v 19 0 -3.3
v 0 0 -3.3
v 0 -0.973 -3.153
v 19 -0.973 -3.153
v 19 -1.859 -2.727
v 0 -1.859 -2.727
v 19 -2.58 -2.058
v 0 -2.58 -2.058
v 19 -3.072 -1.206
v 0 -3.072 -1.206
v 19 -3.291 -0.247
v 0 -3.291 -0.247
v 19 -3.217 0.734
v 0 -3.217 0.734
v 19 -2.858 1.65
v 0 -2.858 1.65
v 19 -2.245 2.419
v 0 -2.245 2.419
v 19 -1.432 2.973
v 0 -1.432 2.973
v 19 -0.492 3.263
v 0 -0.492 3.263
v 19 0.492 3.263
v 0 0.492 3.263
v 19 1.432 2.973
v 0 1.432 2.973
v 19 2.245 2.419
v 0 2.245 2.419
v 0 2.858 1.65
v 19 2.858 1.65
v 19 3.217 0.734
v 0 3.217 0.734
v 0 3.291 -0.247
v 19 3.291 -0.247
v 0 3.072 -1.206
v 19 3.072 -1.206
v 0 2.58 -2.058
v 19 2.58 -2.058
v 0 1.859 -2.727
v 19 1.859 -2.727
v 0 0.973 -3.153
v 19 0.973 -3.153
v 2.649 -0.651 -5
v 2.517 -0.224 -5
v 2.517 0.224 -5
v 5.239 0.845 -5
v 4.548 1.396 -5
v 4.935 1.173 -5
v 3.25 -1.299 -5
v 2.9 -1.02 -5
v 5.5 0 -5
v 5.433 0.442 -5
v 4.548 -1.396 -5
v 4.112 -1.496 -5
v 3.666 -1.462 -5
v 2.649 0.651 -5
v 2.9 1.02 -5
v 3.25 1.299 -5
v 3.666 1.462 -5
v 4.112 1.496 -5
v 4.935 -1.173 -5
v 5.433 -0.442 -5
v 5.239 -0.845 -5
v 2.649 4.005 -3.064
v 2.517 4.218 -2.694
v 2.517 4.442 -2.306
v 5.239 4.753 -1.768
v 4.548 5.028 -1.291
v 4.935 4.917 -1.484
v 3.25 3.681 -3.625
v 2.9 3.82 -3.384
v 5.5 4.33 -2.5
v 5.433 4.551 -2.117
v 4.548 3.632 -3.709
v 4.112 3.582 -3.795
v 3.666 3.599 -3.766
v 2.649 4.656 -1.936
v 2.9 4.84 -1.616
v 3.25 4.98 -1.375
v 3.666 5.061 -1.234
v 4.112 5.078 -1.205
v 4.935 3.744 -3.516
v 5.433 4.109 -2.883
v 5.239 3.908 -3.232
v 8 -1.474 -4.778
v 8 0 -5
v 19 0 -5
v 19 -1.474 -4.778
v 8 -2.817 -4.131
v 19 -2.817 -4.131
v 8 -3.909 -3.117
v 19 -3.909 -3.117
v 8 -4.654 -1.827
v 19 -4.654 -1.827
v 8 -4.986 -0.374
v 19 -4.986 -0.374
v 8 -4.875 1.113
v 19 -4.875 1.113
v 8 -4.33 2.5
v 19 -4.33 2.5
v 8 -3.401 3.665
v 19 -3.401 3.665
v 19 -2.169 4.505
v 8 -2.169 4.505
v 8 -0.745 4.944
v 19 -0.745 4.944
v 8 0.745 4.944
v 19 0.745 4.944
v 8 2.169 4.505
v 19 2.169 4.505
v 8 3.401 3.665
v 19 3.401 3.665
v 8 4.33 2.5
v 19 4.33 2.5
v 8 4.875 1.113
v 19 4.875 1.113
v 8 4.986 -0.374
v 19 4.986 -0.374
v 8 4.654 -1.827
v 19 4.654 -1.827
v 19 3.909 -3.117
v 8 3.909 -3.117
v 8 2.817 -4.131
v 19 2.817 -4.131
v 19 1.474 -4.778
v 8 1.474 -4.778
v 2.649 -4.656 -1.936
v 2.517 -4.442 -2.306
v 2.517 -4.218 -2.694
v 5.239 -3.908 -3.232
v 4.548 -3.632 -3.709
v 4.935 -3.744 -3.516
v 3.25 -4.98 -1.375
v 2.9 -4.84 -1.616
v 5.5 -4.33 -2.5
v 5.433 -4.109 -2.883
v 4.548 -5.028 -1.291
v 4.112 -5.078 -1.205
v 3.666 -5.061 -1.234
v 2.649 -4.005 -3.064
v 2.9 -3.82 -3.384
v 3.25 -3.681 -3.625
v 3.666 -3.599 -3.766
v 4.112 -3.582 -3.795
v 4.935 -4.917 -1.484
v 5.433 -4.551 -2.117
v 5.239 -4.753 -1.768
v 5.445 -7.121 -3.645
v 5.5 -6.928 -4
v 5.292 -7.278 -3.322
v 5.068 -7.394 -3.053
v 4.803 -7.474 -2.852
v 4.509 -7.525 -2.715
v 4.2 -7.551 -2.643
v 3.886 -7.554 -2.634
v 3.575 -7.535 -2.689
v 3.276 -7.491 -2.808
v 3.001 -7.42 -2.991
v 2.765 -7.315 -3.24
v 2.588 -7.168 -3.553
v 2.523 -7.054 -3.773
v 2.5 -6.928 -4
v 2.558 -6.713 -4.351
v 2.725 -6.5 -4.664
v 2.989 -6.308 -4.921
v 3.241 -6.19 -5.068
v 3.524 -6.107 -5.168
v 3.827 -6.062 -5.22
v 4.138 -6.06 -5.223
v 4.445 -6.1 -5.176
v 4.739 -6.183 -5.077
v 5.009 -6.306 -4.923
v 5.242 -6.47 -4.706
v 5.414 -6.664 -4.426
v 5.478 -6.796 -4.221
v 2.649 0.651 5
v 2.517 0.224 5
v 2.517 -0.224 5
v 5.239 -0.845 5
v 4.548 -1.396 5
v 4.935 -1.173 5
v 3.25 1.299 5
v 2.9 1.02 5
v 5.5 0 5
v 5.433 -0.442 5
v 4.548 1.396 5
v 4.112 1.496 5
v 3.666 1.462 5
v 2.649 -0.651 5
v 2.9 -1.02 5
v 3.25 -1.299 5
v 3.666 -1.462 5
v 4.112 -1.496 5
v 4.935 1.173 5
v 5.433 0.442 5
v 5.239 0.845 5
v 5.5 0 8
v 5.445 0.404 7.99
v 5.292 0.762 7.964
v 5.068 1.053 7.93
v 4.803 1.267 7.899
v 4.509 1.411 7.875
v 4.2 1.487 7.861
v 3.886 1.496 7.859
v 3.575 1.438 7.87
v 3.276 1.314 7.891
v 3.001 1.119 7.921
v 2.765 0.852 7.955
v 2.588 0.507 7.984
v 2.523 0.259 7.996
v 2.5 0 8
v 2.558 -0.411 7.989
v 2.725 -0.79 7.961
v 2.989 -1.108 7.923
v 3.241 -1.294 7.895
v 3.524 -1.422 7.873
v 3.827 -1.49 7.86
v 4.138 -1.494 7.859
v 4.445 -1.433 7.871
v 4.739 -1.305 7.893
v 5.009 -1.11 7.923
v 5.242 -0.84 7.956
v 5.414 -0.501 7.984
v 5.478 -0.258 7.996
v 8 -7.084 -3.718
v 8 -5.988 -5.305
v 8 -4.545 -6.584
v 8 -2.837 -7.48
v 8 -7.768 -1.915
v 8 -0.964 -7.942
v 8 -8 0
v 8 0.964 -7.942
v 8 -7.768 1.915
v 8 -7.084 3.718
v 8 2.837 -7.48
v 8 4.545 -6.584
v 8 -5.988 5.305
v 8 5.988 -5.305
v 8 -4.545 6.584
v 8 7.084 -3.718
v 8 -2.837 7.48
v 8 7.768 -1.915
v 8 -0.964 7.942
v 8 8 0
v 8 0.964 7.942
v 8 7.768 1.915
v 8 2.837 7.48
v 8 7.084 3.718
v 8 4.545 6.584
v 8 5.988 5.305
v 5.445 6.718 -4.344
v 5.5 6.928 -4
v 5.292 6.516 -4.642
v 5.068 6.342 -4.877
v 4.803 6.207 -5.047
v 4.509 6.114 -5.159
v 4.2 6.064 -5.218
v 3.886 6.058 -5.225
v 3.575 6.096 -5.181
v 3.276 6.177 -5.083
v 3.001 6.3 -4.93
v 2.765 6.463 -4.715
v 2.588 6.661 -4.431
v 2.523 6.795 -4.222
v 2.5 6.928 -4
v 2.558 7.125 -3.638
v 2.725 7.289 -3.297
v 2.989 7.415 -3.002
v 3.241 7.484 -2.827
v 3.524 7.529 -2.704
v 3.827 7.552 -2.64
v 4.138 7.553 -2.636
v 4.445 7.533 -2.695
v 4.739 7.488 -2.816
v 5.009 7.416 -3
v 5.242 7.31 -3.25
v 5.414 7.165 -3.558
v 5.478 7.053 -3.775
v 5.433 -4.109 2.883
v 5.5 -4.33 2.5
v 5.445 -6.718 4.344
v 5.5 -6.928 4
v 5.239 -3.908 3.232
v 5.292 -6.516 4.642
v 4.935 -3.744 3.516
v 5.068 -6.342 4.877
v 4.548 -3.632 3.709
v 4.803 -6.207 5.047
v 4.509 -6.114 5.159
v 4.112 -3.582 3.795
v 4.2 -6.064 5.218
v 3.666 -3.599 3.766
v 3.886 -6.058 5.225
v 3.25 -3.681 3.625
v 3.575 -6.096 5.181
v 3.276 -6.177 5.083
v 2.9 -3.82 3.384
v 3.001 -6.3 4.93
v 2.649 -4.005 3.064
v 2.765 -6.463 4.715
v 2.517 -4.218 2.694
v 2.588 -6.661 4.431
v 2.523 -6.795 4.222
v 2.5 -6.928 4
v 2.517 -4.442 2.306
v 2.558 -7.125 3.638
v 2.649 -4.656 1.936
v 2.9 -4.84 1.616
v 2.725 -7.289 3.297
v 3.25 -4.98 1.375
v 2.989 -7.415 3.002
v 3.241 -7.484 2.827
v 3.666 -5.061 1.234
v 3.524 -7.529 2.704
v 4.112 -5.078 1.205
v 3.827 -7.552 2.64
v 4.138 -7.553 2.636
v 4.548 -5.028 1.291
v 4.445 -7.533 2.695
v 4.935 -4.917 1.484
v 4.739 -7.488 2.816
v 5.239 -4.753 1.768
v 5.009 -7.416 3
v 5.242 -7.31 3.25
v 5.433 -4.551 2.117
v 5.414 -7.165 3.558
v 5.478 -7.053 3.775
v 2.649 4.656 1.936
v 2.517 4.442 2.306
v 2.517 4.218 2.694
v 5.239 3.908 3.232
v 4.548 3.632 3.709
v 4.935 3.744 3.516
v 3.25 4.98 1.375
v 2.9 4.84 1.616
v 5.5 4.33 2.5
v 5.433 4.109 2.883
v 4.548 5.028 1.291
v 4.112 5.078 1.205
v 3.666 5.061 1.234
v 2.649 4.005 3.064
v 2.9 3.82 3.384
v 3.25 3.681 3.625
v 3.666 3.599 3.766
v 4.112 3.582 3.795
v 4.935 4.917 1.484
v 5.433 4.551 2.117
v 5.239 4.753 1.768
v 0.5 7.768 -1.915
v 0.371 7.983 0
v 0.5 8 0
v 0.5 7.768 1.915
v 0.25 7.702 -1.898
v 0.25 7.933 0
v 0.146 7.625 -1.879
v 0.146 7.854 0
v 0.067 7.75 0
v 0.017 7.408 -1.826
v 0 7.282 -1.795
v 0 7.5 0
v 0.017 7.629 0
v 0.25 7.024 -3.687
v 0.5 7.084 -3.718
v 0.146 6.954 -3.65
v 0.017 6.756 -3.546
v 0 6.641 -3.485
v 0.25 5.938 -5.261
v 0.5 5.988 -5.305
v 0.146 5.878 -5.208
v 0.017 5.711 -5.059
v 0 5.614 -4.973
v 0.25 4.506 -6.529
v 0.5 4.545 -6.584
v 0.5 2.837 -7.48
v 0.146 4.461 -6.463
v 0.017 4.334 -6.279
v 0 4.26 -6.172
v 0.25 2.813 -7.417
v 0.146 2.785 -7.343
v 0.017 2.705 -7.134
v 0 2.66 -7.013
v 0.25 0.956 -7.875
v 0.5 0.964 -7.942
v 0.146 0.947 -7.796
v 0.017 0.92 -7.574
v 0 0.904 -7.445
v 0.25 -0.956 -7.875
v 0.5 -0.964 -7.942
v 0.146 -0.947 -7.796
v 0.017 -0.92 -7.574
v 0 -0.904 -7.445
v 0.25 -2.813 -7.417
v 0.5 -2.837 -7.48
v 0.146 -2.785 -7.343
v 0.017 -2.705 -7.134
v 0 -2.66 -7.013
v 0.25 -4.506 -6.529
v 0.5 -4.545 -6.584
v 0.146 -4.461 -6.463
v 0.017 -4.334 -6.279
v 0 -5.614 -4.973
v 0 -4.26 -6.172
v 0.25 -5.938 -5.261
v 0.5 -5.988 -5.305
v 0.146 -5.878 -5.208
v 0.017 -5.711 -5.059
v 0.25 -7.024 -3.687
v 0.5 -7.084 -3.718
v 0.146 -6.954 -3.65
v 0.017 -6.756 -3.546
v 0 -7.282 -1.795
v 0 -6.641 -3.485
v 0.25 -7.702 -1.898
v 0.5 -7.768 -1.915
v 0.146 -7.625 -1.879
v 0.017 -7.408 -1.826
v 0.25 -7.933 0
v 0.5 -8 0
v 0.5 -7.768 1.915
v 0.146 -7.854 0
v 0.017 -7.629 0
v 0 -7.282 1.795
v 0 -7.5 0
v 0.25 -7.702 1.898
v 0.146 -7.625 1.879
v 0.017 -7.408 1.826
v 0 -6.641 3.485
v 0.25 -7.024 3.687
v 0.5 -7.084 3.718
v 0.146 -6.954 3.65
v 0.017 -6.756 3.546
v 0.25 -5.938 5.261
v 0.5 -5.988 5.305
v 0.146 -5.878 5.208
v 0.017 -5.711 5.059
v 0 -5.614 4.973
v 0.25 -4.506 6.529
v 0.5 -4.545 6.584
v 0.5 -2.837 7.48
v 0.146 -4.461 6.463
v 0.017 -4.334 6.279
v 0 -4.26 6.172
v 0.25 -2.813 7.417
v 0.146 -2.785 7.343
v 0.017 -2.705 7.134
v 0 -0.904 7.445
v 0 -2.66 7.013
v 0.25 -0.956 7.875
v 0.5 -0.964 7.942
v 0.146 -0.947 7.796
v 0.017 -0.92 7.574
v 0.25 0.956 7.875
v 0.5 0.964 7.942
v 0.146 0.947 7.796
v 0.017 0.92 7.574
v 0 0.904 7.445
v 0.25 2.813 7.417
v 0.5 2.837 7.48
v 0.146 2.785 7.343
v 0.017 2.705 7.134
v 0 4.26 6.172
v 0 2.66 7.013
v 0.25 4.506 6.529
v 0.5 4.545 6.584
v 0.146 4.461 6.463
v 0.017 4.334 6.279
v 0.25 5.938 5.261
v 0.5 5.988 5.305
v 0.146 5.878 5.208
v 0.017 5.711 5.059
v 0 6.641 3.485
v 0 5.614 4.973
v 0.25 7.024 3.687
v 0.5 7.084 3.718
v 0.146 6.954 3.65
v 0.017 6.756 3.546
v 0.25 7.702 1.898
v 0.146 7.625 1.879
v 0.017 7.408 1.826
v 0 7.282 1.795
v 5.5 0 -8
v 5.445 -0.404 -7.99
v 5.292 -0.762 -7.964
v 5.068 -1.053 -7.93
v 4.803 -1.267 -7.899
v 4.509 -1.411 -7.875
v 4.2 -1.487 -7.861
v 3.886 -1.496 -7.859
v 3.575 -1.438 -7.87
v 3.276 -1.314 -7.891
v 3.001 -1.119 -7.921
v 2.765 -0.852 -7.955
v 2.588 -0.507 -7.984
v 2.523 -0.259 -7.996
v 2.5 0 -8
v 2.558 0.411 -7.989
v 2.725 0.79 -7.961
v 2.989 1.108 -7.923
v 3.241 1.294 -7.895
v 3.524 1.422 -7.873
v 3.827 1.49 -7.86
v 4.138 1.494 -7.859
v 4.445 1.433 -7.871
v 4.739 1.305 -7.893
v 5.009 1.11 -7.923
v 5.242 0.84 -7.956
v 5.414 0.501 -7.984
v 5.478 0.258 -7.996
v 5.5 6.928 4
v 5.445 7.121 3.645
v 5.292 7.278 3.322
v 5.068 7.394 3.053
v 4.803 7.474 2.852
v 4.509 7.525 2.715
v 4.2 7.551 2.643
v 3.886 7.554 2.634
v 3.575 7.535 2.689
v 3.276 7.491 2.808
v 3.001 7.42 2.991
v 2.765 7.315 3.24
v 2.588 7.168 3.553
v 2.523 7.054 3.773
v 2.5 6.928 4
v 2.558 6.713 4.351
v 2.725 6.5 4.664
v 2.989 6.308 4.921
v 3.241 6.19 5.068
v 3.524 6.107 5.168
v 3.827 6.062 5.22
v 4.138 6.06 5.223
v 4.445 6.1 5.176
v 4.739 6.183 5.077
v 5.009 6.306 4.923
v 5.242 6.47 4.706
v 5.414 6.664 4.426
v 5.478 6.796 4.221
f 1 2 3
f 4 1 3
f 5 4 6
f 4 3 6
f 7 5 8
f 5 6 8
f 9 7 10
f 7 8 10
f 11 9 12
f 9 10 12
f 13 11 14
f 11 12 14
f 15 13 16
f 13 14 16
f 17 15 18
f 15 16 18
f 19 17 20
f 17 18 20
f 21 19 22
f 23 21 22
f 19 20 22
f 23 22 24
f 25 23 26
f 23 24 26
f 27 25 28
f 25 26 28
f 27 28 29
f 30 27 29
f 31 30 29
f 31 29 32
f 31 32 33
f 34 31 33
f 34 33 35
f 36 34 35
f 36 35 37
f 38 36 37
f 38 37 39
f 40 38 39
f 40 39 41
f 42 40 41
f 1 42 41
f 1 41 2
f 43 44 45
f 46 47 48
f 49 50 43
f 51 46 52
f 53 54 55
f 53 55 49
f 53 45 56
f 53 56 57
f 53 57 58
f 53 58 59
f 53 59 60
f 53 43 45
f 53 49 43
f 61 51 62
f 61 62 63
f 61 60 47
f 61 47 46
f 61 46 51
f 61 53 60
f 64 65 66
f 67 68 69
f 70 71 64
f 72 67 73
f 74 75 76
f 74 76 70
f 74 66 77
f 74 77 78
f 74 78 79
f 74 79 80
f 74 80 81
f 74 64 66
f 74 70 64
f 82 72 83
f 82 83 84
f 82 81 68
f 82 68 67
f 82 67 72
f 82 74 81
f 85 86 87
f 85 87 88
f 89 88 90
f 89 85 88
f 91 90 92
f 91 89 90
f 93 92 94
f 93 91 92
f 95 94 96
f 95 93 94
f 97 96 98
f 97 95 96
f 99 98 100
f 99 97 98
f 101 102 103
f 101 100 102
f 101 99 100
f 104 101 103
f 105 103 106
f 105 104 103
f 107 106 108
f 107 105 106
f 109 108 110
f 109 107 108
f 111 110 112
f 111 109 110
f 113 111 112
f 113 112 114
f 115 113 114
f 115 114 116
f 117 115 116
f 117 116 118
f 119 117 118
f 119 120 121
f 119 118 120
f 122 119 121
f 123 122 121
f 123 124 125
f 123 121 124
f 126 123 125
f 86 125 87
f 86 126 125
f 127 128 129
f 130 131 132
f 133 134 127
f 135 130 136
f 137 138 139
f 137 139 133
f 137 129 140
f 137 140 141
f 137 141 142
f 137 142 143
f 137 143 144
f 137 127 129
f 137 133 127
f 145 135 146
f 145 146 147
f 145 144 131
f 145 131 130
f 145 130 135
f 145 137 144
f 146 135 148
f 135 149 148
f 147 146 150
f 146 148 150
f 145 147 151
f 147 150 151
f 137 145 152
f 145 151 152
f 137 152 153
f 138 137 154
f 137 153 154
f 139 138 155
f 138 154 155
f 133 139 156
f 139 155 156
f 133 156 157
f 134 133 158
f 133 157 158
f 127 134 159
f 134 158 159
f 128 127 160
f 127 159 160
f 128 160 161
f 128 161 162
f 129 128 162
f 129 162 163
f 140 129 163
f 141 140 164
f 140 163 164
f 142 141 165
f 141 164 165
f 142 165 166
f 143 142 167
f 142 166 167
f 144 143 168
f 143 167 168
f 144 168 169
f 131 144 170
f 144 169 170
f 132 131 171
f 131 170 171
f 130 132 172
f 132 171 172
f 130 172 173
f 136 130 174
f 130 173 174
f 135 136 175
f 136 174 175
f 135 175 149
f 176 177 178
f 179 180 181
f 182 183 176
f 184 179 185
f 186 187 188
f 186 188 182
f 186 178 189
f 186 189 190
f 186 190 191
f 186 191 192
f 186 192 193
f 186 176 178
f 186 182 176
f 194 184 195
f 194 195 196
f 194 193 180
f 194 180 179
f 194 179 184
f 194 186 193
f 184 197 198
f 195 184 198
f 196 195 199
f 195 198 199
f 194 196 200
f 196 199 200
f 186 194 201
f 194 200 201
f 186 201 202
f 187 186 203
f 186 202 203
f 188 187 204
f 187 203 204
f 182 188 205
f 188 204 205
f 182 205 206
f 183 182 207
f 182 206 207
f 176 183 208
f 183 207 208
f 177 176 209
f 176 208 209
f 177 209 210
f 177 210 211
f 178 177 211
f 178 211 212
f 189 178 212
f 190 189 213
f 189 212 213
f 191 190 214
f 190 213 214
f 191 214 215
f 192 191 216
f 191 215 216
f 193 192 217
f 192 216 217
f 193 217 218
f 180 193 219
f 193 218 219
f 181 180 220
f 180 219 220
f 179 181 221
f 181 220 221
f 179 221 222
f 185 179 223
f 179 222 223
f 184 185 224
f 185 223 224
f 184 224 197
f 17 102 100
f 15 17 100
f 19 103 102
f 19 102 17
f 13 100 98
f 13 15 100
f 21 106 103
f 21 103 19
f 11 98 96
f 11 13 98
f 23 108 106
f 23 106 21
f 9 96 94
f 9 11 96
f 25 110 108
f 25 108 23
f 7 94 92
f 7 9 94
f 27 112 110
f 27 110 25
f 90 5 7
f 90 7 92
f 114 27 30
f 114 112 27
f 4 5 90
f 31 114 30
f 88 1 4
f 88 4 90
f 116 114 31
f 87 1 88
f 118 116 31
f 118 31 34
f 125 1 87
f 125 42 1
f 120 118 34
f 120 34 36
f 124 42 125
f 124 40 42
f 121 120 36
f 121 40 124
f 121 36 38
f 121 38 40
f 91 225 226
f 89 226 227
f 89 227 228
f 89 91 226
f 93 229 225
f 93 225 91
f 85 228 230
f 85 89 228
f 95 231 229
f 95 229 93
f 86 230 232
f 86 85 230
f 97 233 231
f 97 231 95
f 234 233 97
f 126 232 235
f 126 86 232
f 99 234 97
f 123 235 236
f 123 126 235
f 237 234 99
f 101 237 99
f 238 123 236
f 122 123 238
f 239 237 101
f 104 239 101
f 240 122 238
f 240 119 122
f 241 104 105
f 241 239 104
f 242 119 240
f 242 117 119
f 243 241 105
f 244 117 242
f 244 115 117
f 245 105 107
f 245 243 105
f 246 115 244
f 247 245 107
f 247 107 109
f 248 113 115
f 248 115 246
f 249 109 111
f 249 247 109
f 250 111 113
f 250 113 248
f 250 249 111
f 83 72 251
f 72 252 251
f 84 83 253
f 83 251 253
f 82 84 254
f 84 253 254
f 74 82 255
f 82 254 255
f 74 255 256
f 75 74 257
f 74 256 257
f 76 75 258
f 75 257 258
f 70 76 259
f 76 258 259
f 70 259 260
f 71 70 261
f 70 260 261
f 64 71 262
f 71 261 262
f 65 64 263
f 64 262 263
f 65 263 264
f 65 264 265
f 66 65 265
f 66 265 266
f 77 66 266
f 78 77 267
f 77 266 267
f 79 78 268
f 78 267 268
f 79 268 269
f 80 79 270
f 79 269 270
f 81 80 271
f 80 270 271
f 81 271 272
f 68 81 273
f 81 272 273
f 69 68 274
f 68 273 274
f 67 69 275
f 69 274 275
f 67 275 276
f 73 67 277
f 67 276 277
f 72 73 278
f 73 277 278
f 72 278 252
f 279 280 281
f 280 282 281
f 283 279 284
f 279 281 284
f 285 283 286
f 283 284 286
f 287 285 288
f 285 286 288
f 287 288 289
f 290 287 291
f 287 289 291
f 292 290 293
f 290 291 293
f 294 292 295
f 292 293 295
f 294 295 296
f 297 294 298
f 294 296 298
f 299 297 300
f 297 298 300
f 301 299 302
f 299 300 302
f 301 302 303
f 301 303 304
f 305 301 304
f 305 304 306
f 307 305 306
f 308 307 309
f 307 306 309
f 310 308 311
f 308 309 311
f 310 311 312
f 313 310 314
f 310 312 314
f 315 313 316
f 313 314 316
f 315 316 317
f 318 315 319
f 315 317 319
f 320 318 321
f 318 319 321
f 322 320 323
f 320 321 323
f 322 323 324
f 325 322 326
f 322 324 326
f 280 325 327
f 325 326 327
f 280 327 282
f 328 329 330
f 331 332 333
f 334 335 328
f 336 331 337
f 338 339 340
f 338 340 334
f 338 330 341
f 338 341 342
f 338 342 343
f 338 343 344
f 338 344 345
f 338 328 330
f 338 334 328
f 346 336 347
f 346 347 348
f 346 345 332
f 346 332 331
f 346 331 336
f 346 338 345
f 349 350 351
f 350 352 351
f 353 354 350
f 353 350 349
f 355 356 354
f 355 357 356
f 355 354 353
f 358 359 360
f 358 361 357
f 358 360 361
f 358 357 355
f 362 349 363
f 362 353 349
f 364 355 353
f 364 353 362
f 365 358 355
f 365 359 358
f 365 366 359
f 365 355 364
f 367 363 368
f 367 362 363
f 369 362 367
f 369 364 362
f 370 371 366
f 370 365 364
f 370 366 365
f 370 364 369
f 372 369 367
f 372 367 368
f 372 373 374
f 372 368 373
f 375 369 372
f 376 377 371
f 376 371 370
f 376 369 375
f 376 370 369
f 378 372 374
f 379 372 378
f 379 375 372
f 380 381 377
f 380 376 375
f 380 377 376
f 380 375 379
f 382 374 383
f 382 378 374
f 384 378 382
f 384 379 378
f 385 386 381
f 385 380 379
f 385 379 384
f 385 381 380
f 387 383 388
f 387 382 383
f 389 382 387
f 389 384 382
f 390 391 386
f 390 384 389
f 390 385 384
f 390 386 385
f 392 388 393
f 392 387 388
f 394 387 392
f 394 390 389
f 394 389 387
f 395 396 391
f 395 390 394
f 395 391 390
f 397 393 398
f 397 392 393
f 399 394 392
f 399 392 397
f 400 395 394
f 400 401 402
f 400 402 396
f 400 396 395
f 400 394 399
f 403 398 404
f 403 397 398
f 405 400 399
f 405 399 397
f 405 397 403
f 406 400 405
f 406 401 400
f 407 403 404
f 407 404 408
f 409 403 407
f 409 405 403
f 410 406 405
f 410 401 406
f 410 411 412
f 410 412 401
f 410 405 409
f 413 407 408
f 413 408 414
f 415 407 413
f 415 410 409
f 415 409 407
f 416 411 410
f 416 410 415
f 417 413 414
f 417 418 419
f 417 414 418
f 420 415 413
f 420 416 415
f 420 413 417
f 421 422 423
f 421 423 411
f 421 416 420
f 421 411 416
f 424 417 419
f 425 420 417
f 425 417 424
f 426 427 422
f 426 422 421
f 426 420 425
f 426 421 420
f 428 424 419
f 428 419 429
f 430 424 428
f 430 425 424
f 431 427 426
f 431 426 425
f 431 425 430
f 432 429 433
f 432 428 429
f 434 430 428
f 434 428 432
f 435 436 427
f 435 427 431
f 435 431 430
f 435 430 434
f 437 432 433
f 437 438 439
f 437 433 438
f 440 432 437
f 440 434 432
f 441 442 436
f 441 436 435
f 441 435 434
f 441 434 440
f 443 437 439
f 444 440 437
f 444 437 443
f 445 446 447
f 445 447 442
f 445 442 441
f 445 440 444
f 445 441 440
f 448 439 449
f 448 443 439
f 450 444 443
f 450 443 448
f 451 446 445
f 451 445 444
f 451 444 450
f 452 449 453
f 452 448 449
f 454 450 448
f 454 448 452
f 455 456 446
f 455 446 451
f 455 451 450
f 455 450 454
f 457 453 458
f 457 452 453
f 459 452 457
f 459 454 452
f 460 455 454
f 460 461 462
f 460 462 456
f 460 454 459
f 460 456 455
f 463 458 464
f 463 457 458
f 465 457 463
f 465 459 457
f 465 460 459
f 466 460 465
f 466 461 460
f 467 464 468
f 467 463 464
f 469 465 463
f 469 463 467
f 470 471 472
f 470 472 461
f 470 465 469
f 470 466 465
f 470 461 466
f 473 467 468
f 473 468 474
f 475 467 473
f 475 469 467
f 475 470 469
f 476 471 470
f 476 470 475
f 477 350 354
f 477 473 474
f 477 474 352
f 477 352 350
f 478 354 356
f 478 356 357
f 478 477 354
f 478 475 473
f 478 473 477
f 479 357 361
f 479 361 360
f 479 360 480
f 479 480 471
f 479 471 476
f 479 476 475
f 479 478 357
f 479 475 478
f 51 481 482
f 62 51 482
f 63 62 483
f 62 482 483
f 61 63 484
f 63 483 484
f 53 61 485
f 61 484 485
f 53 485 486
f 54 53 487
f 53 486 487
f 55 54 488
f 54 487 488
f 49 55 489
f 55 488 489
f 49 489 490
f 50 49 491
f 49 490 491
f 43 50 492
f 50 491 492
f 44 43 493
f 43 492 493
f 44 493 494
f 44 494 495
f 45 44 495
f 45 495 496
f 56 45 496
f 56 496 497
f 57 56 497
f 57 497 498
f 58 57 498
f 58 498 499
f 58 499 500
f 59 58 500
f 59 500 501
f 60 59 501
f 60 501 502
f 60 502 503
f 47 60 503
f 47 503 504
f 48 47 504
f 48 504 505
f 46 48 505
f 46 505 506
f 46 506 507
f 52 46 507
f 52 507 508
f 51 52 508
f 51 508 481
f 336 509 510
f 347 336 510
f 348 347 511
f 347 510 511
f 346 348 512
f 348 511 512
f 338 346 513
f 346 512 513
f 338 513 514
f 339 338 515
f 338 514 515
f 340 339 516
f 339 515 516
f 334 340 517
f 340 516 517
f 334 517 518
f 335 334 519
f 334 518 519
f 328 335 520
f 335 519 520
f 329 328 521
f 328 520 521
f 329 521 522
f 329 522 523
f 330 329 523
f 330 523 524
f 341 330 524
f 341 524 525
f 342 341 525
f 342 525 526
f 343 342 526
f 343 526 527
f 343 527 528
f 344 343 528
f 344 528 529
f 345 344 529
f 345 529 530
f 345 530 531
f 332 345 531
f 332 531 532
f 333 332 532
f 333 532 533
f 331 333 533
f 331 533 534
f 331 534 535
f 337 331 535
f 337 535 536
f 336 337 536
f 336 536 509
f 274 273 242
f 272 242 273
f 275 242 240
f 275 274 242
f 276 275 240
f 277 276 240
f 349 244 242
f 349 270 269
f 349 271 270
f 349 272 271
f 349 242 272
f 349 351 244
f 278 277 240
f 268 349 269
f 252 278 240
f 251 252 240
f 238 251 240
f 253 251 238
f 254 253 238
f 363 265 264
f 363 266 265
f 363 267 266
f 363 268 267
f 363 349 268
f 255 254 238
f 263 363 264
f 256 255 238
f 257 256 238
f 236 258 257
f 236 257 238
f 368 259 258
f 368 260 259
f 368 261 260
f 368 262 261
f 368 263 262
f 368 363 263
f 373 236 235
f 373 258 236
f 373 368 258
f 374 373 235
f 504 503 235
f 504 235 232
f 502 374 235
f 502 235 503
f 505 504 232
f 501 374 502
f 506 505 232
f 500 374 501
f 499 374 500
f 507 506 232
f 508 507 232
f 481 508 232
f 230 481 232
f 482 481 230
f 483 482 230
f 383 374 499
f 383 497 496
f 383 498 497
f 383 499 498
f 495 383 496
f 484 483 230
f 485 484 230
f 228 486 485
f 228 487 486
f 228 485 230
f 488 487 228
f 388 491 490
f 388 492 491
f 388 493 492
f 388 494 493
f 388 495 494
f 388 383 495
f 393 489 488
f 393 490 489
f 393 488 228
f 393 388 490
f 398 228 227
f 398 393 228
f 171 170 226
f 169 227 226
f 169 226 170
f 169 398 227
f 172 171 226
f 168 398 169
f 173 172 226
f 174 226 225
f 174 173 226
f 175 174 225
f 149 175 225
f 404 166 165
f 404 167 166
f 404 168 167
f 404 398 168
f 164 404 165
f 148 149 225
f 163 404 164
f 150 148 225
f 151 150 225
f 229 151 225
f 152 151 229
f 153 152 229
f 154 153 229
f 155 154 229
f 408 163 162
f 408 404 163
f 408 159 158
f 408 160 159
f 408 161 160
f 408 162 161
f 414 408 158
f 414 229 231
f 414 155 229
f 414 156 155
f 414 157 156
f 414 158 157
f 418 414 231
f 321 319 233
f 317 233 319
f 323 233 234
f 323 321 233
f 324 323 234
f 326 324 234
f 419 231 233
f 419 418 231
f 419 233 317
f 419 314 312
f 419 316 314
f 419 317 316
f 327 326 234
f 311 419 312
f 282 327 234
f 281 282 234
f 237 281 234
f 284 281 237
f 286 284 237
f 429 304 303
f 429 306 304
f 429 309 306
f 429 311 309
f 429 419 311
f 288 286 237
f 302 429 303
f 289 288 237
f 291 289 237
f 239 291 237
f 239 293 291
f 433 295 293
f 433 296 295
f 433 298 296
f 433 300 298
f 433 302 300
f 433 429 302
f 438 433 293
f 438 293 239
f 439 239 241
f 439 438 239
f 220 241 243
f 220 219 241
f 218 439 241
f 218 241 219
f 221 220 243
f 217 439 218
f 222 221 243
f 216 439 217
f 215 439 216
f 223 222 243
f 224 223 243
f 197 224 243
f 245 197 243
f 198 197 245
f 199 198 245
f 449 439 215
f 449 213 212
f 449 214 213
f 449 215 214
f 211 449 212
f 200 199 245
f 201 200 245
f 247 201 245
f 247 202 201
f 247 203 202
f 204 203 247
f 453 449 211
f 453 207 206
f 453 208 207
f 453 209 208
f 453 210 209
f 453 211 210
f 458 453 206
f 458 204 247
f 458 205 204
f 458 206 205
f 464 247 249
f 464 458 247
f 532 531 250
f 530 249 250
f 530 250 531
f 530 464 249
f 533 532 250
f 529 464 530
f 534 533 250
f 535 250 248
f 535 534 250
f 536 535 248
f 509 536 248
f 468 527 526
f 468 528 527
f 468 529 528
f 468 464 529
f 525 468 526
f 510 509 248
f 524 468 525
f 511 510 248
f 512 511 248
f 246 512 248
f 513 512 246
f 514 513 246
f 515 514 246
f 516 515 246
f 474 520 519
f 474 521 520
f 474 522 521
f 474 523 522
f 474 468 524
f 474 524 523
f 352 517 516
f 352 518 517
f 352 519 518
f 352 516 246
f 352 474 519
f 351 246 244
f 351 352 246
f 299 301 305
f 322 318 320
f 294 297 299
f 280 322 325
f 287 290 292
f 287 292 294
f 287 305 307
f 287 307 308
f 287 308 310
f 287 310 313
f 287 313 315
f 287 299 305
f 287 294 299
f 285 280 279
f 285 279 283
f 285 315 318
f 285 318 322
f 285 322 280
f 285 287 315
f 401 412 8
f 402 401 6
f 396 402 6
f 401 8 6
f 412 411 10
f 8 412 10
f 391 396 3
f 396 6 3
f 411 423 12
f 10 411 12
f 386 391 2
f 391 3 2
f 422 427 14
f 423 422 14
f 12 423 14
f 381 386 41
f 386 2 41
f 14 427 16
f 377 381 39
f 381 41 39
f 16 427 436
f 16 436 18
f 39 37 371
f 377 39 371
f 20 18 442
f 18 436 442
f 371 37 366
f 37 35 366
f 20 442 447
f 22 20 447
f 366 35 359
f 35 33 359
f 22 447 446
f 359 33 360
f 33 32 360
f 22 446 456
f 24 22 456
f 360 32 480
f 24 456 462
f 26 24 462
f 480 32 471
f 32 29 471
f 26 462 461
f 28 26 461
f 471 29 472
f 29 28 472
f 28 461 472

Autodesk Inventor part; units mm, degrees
ref_plane "YZ Plane" through (0, 0, 0) normal (1, 0, 0) x (0, 1, 0)
ref_plane "XZ Plane" through (0, 0, 0) normal (0, 1, 0) x (-1, 0, 0)
sketch "Skizze1" plane through (0, 0, 0) normal (1, 0, 0) x (0, 1, 0)
  circle A0 centre (0, 0) radius 8
  dimension "d0" = 16
extrude "Extrusion1" add sketch "Skizze1" along normal blind 8
sketch "Skizze2" plane through (8, 0, 0) normal (1, 0, 0) x (0, 0, -1)
  circle A0 centre (0, 0) radius 5
  dimension "d3" = 10
extrude "Extrusion2" add sketch "Skizze2" along normal blind 11
thread "Gewinde1" size "M10x1.5" class "6g" standard "ISO Metric profile" length 16
ref_plane "Arbeitsebene1" through (0, 0, 8) normal (0, 0, 1) x (1, 0, 0)
sketch "Skizze3" plane through (0, 0, 8) normal (0, 0, 1) x (1, 0, 0)
  circle A0 centre (4, 0) radius 1.5
  point P0 (0, 0)
  dimension "d9" = 3
extrude "Extrusion3" cut sketch "Skizze3" against normal blind 3
sketch "Skizze4" plane through (19, 0, 0) normal (1, 0, 0) x (0, 0, -1)
  point P0 (0, 0)
hole "Bohrung1" at (19, 0, 0) direction (-1, 0, 0) diameter 6.6 depth 19 clearance for "Flachkopfsenkschraube ISO 2009/7046" size "M6" standard "ISO"
pattern_circular "Runde Anordnung1" count 6 over 360 about axis through (0, 0, 0) along (1, 0, 0) of "Extrusion3"
fillet "Rundung1" radius 0.5 1 edges at (0, -8, 0)
properties part number "sf_Piston_Rod_Gland_1"
